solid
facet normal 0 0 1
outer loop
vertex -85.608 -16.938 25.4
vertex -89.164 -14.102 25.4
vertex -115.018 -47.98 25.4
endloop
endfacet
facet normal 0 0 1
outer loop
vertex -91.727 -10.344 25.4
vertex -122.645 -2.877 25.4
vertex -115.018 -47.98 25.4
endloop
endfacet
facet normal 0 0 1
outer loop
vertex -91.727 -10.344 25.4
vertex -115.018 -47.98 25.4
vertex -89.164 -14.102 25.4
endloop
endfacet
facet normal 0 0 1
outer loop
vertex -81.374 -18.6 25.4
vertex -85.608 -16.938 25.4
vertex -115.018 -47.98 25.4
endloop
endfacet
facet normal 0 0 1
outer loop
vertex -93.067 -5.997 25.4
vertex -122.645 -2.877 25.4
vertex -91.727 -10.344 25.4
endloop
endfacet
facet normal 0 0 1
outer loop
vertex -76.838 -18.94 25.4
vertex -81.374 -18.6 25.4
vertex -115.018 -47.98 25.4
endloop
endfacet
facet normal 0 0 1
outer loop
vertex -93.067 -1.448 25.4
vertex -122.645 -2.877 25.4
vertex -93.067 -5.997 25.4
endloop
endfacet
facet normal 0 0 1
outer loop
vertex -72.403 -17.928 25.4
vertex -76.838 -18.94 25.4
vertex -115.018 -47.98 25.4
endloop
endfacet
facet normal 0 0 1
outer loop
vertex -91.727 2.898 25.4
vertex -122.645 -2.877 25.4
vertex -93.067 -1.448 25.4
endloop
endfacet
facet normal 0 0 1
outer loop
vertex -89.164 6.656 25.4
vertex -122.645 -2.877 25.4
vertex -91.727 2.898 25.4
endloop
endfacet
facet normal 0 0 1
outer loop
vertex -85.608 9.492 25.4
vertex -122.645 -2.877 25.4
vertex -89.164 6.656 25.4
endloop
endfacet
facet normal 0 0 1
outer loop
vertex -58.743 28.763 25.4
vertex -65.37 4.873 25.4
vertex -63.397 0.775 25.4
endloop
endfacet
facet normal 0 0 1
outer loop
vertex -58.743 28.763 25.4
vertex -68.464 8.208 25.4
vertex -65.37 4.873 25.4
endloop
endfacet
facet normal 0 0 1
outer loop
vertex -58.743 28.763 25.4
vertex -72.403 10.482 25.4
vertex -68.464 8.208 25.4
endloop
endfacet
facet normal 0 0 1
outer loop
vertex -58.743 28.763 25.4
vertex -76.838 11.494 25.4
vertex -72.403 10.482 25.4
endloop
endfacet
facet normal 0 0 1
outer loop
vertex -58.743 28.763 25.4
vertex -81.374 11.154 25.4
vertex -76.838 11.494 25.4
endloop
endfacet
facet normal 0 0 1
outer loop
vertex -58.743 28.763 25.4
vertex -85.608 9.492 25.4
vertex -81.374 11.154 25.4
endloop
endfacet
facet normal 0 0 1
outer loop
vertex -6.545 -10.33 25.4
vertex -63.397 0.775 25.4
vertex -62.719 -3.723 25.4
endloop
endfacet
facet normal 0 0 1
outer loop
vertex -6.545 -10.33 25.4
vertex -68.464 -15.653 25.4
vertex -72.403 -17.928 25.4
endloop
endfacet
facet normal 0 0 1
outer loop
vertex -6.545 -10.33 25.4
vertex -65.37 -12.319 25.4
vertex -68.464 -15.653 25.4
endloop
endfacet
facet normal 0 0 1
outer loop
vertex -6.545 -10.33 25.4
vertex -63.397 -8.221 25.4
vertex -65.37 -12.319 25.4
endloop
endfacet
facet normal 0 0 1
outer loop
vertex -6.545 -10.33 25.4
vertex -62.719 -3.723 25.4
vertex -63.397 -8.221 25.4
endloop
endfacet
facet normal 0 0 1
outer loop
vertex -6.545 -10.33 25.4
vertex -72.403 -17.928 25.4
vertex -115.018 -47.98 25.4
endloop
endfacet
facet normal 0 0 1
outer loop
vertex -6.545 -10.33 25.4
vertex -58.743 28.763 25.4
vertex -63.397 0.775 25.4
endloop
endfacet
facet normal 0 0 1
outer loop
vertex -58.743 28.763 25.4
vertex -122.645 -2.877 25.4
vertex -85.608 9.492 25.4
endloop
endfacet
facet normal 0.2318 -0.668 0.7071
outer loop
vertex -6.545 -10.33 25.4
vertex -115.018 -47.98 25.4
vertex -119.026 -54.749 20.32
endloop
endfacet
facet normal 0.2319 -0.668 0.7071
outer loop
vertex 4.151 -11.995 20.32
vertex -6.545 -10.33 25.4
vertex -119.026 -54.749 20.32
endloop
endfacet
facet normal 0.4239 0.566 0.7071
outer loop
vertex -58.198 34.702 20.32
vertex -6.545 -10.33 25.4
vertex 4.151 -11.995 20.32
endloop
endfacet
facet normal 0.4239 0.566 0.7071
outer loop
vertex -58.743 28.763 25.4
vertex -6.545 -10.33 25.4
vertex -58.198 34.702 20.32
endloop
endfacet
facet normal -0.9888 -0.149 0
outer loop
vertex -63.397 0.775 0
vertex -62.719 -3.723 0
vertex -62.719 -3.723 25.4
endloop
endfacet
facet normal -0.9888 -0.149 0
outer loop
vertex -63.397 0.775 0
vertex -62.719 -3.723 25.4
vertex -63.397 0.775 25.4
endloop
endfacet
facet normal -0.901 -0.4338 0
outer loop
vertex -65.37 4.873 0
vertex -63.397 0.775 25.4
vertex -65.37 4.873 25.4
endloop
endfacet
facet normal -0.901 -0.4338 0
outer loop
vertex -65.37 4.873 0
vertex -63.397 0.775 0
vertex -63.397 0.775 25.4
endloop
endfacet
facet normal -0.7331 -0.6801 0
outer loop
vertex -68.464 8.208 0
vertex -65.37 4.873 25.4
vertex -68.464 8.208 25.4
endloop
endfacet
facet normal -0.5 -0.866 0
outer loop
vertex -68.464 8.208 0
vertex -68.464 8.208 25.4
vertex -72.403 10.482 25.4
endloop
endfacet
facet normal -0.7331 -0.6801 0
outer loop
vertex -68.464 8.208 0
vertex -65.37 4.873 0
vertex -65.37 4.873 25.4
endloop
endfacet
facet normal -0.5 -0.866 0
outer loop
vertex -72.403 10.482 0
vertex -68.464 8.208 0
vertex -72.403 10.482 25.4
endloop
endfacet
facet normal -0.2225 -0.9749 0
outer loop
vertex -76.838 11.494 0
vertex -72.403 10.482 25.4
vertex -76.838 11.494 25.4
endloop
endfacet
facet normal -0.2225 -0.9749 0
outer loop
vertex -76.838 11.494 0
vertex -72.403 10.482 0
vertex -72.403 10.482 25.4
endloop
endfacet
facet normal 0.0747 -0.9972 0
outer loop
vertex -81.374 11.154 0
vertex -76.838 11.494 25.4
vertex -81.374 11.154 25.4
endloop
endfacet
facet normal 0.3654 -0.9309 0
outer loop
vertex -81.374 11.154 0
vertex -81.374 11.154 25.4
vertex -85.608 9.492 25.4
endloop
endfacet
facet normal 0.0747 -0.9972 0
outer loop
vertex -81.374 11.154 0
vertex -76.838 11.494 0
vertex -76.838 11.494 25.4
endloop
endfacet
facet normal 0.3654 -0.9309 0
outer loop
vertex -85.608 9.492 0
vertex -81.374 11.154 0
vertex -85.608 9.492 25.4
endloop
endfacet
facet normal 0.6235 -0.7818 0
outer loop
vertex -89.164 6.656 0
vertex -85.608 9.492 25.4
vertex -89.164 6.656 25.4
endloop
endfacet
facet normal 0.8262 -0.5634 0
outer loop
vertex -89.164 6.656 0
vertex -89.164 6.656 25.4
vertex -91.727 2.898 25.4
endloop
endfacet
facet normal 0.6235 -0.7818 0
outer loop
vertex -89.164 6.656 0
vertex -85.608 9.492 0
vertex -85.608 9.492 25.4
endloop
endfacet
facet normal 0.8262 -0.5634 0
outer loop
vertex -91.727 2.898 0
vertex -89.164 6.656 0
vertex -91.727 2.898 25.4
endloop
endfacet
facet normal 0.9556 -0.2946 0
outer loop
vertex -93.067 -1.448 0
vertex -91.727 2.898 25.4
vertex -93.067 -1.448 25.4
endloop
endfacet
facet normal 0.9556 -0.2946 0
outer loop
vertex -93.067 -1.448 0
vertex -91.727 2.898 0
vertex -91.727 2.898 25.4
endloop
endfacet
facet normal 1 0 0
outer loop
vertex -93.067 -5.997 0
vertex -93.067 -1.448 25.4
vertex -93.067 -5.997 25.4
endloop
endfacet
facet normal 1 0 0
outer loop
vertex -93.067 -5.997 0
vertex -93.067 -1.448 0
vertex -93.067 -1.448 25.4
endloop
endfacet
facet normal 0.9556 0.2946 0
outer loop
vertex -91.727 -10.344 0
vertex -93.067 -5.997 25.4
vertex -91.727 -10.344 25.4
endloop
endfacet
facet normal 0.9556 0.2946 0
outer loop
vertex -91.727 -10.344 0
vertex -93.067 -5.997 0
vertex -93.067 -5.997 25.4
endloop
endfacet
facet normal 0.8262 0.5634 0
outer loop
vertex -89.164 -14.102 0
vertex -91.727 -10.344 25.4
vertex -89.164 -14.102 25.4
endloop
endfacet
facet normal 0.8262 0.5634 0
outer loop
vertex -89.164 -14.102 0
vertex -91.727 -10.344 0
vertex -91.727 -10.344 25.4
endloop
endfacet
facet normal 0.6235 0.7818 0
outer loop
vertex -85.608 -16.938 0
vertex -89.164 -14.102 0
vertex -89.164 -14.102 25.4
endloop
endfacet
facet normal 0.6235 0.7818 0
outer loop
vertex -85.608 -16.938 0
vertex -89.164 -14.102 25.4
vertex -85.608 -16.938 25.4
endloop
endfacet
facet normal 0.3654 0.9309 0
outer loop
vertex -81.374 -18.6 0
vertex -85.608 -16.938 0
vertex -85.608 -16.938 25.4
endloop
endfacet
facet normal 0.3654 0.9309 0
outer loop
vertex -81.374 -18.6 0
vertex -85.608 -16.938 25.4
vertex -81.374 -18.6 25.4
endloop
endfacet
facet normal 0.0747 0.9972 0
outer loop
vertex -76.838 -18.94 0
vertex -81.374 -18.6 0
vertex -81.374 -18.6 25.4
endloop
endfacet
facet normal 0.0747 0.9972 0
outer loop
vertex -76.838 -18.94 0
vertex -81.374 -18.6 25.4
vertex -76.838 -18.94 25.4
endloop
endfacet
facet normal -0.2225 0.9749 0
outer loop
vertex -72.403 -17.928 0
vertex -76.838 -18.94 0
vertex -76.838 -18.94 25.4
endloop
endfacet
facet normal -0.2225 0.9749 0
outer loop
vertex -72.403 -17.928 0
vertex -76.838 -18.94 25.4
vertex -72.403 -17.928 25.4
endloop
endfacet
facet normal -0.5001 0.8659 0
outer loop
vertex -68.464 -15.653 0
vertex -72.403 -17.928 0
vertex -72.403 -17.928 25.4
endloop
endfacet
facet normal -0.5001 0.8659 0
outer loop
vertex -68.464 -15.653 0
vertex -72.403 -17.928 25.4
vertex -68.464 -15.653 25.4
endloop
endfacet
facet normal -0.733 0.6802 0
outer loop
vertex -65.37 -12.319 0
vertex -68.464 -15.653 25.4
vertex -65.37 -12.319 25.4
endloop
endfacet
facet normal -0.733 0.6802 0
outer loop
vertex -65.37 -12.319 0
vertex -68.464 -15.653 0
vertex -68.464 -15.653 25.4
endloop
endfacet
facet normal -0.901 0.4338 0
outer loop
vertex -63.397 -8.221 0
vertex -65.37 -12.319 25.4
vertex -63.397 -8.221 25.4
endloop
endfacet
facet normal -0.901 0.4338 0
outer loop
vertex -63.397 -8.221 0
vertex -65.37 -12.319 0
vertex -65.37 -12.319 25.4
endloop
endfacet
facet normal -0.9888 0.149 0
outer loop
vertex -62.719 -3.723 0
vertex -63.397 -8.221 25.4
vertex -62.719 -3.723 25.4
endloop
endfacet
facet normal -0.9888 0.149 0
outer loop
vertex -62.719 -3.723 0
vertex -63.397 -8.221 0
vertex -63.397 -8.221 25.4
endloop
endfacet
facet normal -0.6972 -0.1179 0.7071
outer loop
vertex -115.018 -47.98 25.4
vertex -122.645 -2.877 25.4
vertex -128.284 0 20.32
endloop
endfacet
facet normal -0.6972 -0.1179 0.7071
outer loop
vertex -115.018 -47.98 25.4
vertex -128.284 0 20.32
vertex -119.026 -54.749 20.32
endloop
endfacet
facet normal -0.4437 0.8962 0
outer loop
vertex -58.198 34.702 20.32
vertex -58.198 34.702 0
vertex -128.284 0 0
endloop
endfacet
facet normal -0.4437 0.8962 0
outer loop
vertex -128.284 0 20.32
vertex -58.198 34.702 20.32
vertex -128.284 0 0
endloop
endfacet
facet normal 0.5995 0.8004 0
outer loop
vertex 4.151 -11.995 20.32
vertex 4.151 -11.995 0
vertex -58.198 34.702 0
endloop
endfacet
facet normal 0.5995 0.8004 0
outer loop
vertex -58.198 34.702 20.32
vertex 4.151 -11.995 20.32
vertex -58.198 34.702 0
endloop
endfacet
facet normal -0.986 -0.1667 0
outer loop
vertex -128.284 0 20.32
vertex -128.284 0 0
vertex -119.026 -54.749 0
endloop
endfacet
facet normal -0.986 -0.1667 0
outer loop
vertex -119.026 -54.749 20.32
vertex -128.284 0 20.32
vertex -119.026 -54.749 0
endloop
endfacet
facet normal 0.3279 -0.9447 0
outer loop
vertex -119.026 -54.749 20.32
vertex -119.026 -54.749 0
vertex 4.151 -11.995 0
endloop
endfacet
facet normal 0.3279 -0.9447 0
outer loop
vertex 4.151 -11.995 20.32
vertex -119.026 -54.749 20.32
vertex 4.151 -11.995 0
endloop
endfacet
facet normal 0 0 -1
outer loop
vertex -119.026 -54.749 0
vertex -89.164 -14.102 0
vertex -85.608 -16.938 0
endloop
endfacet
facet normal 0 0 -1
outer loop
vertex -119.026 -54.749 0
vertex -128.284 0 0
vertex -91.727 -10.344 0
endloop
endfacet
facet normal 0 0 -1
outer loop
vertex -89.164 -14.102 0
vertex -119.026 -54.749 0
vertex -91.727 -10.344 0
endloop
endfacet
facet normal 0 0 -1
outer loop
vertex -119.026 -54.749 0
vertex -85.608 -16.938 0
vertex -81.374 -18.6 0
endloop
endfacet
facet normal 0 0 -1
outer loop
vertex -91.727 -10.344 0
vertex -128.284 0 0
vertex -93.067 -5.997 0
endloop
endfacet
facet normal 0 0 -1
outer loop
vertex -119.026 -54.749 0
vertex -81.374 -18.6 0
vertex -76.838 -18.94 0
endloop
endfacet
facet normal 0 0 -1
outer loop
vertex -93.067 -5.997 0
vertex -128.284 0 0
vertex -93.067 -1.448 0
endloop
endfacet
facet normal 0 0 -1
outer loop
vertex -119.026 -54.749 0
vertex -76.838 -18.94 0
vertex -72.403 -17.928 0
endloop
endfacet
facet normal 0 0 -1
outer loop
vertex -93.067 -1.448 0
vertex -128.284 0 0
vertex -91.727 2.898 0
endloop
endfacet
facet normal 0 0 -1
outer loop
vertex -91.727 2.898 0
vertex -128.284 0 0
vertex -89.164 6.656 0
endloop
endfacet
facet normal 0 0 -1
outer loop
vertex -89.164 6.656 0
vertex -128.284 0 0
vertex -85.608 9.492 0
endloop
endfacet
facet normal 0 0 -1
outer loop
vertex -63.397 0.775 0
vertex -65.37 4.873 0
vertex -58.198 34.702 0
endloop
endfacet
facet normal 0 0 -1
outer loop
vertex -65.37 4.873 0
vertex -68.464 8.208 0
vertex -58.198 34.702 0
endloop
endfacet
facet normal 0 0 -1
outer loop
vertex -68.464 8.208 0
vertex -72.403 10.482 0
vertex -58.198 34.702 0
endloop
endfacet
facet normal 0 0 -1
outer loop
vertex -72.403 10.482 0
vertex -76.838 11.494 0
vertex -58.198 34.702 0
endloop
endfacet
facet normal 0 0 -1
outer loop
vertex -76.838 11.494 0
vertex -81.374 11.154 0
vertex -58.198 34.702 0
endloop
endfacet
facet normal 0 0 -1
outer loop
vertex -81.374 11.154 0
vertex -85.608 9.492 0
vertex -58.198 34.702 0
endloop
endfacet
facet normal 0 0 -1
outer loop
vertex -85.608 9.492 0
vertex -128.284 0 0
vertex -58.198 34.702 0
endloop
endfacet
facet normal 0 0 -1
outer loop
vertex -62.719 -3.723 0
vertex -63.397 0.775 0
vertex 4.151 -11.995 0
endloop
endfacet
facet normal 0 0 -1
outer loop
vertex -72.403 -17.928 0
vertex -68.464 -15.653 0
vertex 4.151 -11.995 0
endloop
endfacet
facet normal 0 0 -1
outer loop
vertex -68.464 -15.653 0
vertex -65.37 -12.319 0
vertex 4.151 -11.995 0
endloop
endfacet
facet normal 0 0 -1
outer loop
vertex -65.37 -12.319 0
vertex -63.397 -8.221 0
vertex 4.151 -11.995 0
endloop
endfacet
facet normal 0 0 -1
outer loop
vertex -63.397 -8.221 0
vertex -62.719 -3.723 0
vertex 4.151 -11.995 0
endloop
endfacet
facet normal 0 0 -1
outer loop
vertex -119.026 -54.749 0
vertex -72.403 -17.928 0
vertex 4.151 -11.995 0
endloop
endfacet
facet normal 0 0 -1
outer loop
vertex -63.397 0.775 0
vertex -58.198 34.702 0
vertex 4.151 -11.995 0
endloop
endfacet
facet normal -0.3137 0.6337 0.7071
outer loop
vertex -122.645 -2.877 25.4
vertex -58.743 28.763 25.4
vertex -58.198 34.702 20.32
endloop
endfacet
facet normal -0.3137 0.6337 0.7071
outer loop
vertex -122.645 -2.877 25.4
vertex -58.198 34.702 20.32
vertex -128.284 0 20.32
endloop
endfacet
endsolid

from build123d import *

# Parameters (mm, degrees)
F0_R     = 15.259541
F1_DEPTH = 25.4
F2_SIZE  = 5.08


with BuildPart() as f1:
    # F0 (on Top) → F1 (new body)
    with BuildSketch(Plane.XY):
        Polygon((-58.197681, 34.701545), (-128.283679, 0), (-119.025573, -54.748576), (4.151391, -11.995041), align=None)
        with Locations((-77.978395, -3.722796)):
            Circle(F0_R, mode=Mode.SUBTRACT)
    extrude(amount=F1_DEPTH)

    # F2
    f2_edges = [f1.edges().sort_by_distance(p)[0] for p in [
        (-93.24068, 17.350772, 25.4),
        (-123.654626, -27.374288, 25.4),
        (-57.437091, -33.371808, 25.4),
        (-27.023145, 11.353252, 25.4),
    ]]
    chamfer(f2_edges, length=F2_SIZE)


solid = f1.part
